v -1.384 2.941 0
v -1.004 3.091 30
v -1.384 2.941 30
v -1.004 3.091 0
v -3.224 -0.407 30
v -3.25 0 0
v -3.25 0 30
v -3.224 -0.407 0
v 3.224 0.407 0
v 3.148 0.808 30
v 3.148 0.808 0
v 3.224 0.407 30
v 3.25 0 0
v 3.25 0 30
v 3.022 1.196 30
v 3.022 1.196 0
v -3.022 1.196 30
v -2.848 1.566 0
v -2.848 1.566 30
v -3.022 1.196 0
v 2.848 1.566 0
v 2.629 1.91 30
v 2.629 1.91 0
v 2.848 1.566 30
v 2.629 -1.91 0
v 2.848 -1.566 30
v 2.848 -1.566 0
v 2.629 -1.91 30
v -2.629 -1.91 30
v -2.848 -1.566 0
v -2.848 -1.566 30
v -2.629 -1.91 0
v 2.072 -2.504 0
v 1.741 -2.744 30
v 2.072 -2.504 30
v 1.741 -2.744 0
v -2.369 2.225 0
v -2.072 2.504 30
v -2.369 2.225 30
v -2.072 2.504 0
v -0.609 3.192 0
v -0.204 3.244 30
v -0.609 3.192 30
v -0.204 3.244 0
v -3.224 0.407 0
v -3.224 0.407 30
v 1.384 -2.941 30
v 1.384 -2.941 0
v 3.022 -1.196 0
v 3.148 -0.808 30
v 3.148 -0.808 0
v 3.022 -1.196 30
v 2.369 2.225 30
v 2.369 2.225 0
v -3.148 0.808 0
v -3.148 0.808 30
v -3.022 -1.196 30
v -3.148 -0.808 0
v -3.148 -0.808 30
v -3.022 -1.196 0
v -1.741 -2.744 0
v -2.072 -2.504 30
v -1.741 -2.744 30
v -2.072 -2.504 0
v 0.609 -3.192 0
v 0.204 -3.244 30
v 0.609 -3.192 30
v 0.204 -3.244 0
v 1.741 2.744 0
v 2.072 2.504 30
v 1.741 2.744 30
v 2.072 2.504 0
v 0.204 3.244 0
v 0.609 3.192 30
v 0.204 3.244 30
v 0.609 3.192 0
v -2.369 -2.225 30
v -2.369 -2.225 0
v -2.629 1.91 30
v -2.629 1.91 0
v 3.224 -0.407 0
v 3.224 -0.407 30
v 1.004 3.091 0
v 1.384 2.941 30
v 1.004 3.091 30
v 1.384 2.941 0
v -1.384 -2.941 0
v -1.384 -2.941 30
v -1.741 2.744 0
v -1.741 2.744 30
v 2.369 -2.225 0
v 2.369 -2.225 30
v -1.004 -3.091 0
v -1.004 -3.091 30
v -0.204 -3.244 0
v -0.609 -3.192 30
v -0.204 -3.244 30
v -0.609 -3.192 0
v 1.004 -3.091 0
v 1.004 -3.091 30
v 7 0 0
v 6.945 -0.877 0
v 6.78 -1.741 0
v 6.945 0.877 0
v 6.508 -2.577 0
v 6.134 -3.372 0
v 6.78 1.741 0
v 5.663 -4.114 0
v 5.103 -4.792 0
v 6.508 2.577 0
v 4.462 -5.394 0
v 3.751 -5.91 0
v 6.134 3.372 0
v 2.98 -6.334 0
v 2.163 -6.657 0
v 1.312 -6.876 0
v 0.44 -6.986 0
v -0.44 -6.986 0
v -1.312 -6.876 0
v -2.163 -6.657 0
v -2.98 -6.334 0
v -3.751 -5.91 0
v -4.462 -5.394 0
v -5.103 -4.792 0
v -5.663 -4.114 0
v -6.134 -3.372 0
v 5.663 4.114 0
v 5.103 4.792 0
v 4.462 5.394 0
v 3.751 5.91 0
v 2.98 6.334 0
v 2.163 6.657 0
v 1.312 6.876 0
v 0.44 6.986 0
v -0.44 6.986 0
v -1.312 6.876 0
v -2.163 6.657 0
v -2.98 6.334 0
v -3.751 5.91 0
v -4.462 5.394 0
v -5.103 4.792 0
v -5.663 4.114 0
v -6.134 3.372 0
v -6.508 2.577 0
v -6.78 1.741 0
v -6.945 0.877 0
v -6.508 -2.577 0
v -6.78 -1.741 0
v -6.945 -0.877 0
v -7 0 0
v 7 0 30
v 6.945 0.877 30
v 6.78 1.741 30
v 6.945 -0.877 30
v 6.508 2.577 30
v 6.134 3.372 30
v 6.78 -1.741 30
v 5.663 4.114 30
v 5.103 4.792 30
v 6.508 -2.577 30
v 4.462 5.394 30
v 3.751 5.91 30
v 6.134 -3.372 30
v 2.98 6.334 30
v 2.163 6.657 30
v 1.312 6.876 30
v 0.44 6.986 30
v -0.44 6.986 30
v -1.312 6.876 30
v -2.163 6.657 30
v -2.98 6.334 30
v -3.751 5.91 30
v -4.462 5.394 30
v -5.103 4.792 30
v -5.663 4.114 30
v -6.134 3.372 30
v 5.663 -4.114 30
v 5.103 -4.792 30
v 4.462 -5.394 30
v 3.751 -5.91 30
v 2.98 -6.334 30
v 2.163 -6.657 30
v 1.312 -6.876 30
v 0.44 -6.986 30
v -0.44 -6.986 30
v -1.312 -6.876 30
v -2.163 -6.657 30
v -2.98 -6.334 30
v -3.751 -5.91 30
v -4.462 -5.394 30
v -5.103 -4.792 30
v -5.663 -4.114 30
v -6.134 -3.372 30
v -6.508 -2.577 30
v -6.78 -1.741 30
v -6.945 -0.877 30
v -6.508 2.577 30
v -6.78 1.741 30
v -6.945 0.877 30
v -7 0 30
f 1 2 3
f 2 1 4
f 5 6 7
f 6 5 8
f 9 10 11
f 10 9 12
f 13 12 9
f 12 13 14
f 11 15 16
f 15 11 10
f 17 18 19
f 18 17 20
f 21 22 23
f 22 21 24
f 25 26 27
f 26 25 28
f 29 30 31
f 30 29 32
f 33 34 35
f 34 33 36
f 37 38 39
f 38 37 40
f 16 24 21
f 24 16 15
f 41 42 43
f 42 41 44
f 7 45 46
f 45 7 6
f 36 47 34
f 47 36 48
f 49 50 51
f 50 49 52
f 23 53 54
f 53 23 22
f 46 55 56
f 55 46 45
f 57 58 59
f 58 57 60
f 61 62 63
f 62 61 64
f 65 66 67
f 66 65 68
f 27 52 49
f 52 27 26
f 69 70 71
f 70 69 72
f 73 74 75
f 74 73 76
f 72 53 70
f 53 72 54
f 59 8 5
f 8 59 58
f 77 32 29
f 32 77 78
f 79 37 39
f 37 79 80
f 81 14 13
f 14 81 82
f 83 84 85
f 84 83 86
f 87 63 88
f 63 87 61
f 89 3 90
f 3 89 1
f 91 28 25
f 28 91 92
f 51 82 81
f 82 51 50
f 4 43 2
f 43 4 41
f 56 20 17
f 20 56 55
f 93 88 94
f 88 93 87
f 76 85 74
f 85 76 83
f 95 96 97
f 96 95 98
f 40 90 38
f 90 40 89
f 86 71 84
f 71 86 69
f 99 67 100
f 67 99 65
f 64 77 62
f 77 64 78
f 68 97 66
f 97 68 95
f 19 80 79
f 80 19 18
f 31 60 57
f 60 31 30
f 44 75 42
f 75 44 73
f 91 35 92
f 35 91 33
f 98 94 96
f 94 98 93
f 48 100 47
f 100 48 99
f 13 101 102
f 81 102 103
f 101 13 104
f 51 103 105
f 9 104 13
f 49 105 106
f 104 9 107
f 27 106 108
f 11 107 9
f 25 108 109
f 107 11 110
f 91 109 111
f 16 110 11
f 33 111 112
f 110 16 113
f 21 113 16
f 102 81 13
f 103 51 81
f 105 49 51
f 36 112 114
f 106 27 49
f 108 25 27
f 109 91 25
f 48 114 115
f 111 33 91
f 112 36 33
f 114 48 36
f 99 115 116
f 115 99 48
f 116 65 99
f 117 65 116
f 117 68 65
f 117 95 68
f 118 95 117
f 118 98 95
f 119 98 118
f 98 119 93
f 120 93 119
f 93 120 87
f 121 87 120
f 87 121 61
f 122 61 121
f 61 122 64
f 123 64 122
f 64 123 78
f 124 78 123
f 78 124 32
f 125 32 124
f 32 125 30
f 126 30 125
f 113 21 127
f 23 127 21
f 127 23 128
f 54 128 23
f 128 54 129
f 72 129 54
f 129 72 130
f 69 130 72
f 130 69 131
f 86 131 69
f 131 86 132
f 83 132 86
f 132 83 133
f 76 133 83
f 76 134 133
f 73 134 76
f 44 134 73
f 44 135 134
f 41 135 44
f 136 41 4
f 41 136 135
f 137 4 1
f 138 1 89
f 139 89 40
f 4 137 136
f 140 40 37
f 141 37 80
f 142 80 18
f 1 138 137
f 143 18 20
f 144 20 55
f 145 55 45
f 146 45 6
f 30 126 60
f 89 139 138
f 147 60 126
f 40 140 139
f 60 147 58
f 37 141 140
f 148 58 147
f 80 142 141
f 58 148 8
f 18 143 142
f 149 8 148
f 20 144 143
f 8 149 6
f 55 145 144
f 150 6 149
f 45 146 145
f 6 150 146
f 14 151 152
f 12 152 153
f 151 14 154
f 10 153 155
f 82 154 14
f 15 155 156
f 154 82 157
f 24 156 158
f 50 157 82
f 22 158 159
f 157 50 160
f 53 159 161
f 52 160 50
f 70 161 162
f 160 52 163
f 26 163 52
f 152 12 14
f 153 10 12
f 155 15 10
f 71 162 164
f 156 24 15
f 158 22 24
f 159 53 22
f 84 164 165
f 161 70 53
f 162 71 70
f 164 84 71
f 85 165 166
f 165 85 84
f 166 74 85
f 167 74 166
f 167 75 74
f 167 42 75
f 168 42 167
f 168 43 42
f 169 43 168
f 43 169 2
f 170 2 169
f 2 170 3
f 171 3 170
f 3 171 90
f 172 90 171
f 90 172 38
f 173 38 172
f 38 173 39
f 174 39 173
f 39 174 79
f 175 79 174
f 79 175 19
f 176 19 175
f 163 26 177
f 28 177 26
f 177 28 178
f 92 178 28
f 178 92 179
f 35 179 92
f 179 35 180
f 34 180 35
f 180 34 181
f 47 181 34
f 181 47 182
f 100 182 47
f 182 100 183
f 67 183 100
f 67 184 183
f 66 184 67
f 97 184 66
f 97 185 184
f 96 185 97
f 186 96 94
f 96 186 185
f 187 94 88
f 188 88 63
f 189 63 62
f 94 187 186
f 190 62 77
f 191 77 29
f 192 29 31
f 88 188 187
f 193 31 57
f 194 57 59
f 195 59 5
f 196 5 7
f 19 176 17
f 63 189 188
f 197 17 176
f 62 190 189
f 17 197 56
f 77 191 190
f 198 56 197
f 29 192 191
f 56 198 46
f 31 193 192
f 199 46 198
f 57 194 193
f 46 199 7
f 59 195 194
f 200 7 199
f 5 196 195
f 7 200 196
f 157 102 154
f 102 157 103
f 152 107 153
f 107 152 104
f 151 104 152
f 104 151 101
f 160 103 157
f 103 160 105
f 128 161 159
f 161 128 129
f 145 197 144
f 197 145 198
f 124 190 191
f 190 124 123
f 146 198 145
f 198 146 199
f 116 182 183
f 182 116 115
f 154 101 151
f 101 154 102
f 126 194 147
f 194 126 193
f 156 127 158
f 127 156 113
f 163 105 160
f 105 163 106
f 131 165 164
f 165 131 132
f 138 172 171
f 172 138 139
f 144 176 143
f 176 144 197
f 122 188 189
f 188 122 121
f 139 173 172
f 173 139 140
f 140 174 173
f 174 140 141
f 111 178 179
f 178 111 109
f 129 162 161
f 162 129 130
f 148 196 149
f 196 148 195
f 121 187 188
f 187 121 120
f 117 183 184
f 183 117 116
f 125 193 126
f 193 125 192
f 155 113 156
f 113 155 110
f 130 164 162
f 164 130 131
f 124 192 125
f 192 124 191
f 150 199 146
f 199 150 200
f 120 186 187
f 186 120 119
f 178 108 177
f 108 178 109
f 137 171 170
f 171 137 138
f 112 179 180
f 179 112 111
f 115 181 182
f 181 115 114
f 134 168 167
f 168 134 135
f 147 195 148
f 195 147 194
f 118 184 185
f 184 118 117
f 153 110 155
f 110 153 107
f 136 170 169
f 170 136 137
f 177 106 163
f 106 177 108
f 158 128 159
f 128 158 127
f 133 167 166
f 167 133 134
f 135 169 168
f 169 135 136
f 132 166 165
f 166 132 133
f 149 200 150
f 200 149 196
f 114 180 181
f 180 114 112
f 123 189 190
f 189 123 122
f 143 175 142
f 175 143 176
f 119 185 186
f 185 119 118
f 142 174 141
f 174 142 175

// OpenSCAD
$fn = 50;


difference() {
	union() {
		cylinder(h = 30, r = 7.0000000000);
	}
	union() {
		cylinder(h = 30, r = 3.2500000000);
		cylinder(h = 30, r = 1.8000000000);
		cylinder(h = 30, r = 1.8000000000);
		cylinder(h = 30, r = 1.8000000000);
	}
}
